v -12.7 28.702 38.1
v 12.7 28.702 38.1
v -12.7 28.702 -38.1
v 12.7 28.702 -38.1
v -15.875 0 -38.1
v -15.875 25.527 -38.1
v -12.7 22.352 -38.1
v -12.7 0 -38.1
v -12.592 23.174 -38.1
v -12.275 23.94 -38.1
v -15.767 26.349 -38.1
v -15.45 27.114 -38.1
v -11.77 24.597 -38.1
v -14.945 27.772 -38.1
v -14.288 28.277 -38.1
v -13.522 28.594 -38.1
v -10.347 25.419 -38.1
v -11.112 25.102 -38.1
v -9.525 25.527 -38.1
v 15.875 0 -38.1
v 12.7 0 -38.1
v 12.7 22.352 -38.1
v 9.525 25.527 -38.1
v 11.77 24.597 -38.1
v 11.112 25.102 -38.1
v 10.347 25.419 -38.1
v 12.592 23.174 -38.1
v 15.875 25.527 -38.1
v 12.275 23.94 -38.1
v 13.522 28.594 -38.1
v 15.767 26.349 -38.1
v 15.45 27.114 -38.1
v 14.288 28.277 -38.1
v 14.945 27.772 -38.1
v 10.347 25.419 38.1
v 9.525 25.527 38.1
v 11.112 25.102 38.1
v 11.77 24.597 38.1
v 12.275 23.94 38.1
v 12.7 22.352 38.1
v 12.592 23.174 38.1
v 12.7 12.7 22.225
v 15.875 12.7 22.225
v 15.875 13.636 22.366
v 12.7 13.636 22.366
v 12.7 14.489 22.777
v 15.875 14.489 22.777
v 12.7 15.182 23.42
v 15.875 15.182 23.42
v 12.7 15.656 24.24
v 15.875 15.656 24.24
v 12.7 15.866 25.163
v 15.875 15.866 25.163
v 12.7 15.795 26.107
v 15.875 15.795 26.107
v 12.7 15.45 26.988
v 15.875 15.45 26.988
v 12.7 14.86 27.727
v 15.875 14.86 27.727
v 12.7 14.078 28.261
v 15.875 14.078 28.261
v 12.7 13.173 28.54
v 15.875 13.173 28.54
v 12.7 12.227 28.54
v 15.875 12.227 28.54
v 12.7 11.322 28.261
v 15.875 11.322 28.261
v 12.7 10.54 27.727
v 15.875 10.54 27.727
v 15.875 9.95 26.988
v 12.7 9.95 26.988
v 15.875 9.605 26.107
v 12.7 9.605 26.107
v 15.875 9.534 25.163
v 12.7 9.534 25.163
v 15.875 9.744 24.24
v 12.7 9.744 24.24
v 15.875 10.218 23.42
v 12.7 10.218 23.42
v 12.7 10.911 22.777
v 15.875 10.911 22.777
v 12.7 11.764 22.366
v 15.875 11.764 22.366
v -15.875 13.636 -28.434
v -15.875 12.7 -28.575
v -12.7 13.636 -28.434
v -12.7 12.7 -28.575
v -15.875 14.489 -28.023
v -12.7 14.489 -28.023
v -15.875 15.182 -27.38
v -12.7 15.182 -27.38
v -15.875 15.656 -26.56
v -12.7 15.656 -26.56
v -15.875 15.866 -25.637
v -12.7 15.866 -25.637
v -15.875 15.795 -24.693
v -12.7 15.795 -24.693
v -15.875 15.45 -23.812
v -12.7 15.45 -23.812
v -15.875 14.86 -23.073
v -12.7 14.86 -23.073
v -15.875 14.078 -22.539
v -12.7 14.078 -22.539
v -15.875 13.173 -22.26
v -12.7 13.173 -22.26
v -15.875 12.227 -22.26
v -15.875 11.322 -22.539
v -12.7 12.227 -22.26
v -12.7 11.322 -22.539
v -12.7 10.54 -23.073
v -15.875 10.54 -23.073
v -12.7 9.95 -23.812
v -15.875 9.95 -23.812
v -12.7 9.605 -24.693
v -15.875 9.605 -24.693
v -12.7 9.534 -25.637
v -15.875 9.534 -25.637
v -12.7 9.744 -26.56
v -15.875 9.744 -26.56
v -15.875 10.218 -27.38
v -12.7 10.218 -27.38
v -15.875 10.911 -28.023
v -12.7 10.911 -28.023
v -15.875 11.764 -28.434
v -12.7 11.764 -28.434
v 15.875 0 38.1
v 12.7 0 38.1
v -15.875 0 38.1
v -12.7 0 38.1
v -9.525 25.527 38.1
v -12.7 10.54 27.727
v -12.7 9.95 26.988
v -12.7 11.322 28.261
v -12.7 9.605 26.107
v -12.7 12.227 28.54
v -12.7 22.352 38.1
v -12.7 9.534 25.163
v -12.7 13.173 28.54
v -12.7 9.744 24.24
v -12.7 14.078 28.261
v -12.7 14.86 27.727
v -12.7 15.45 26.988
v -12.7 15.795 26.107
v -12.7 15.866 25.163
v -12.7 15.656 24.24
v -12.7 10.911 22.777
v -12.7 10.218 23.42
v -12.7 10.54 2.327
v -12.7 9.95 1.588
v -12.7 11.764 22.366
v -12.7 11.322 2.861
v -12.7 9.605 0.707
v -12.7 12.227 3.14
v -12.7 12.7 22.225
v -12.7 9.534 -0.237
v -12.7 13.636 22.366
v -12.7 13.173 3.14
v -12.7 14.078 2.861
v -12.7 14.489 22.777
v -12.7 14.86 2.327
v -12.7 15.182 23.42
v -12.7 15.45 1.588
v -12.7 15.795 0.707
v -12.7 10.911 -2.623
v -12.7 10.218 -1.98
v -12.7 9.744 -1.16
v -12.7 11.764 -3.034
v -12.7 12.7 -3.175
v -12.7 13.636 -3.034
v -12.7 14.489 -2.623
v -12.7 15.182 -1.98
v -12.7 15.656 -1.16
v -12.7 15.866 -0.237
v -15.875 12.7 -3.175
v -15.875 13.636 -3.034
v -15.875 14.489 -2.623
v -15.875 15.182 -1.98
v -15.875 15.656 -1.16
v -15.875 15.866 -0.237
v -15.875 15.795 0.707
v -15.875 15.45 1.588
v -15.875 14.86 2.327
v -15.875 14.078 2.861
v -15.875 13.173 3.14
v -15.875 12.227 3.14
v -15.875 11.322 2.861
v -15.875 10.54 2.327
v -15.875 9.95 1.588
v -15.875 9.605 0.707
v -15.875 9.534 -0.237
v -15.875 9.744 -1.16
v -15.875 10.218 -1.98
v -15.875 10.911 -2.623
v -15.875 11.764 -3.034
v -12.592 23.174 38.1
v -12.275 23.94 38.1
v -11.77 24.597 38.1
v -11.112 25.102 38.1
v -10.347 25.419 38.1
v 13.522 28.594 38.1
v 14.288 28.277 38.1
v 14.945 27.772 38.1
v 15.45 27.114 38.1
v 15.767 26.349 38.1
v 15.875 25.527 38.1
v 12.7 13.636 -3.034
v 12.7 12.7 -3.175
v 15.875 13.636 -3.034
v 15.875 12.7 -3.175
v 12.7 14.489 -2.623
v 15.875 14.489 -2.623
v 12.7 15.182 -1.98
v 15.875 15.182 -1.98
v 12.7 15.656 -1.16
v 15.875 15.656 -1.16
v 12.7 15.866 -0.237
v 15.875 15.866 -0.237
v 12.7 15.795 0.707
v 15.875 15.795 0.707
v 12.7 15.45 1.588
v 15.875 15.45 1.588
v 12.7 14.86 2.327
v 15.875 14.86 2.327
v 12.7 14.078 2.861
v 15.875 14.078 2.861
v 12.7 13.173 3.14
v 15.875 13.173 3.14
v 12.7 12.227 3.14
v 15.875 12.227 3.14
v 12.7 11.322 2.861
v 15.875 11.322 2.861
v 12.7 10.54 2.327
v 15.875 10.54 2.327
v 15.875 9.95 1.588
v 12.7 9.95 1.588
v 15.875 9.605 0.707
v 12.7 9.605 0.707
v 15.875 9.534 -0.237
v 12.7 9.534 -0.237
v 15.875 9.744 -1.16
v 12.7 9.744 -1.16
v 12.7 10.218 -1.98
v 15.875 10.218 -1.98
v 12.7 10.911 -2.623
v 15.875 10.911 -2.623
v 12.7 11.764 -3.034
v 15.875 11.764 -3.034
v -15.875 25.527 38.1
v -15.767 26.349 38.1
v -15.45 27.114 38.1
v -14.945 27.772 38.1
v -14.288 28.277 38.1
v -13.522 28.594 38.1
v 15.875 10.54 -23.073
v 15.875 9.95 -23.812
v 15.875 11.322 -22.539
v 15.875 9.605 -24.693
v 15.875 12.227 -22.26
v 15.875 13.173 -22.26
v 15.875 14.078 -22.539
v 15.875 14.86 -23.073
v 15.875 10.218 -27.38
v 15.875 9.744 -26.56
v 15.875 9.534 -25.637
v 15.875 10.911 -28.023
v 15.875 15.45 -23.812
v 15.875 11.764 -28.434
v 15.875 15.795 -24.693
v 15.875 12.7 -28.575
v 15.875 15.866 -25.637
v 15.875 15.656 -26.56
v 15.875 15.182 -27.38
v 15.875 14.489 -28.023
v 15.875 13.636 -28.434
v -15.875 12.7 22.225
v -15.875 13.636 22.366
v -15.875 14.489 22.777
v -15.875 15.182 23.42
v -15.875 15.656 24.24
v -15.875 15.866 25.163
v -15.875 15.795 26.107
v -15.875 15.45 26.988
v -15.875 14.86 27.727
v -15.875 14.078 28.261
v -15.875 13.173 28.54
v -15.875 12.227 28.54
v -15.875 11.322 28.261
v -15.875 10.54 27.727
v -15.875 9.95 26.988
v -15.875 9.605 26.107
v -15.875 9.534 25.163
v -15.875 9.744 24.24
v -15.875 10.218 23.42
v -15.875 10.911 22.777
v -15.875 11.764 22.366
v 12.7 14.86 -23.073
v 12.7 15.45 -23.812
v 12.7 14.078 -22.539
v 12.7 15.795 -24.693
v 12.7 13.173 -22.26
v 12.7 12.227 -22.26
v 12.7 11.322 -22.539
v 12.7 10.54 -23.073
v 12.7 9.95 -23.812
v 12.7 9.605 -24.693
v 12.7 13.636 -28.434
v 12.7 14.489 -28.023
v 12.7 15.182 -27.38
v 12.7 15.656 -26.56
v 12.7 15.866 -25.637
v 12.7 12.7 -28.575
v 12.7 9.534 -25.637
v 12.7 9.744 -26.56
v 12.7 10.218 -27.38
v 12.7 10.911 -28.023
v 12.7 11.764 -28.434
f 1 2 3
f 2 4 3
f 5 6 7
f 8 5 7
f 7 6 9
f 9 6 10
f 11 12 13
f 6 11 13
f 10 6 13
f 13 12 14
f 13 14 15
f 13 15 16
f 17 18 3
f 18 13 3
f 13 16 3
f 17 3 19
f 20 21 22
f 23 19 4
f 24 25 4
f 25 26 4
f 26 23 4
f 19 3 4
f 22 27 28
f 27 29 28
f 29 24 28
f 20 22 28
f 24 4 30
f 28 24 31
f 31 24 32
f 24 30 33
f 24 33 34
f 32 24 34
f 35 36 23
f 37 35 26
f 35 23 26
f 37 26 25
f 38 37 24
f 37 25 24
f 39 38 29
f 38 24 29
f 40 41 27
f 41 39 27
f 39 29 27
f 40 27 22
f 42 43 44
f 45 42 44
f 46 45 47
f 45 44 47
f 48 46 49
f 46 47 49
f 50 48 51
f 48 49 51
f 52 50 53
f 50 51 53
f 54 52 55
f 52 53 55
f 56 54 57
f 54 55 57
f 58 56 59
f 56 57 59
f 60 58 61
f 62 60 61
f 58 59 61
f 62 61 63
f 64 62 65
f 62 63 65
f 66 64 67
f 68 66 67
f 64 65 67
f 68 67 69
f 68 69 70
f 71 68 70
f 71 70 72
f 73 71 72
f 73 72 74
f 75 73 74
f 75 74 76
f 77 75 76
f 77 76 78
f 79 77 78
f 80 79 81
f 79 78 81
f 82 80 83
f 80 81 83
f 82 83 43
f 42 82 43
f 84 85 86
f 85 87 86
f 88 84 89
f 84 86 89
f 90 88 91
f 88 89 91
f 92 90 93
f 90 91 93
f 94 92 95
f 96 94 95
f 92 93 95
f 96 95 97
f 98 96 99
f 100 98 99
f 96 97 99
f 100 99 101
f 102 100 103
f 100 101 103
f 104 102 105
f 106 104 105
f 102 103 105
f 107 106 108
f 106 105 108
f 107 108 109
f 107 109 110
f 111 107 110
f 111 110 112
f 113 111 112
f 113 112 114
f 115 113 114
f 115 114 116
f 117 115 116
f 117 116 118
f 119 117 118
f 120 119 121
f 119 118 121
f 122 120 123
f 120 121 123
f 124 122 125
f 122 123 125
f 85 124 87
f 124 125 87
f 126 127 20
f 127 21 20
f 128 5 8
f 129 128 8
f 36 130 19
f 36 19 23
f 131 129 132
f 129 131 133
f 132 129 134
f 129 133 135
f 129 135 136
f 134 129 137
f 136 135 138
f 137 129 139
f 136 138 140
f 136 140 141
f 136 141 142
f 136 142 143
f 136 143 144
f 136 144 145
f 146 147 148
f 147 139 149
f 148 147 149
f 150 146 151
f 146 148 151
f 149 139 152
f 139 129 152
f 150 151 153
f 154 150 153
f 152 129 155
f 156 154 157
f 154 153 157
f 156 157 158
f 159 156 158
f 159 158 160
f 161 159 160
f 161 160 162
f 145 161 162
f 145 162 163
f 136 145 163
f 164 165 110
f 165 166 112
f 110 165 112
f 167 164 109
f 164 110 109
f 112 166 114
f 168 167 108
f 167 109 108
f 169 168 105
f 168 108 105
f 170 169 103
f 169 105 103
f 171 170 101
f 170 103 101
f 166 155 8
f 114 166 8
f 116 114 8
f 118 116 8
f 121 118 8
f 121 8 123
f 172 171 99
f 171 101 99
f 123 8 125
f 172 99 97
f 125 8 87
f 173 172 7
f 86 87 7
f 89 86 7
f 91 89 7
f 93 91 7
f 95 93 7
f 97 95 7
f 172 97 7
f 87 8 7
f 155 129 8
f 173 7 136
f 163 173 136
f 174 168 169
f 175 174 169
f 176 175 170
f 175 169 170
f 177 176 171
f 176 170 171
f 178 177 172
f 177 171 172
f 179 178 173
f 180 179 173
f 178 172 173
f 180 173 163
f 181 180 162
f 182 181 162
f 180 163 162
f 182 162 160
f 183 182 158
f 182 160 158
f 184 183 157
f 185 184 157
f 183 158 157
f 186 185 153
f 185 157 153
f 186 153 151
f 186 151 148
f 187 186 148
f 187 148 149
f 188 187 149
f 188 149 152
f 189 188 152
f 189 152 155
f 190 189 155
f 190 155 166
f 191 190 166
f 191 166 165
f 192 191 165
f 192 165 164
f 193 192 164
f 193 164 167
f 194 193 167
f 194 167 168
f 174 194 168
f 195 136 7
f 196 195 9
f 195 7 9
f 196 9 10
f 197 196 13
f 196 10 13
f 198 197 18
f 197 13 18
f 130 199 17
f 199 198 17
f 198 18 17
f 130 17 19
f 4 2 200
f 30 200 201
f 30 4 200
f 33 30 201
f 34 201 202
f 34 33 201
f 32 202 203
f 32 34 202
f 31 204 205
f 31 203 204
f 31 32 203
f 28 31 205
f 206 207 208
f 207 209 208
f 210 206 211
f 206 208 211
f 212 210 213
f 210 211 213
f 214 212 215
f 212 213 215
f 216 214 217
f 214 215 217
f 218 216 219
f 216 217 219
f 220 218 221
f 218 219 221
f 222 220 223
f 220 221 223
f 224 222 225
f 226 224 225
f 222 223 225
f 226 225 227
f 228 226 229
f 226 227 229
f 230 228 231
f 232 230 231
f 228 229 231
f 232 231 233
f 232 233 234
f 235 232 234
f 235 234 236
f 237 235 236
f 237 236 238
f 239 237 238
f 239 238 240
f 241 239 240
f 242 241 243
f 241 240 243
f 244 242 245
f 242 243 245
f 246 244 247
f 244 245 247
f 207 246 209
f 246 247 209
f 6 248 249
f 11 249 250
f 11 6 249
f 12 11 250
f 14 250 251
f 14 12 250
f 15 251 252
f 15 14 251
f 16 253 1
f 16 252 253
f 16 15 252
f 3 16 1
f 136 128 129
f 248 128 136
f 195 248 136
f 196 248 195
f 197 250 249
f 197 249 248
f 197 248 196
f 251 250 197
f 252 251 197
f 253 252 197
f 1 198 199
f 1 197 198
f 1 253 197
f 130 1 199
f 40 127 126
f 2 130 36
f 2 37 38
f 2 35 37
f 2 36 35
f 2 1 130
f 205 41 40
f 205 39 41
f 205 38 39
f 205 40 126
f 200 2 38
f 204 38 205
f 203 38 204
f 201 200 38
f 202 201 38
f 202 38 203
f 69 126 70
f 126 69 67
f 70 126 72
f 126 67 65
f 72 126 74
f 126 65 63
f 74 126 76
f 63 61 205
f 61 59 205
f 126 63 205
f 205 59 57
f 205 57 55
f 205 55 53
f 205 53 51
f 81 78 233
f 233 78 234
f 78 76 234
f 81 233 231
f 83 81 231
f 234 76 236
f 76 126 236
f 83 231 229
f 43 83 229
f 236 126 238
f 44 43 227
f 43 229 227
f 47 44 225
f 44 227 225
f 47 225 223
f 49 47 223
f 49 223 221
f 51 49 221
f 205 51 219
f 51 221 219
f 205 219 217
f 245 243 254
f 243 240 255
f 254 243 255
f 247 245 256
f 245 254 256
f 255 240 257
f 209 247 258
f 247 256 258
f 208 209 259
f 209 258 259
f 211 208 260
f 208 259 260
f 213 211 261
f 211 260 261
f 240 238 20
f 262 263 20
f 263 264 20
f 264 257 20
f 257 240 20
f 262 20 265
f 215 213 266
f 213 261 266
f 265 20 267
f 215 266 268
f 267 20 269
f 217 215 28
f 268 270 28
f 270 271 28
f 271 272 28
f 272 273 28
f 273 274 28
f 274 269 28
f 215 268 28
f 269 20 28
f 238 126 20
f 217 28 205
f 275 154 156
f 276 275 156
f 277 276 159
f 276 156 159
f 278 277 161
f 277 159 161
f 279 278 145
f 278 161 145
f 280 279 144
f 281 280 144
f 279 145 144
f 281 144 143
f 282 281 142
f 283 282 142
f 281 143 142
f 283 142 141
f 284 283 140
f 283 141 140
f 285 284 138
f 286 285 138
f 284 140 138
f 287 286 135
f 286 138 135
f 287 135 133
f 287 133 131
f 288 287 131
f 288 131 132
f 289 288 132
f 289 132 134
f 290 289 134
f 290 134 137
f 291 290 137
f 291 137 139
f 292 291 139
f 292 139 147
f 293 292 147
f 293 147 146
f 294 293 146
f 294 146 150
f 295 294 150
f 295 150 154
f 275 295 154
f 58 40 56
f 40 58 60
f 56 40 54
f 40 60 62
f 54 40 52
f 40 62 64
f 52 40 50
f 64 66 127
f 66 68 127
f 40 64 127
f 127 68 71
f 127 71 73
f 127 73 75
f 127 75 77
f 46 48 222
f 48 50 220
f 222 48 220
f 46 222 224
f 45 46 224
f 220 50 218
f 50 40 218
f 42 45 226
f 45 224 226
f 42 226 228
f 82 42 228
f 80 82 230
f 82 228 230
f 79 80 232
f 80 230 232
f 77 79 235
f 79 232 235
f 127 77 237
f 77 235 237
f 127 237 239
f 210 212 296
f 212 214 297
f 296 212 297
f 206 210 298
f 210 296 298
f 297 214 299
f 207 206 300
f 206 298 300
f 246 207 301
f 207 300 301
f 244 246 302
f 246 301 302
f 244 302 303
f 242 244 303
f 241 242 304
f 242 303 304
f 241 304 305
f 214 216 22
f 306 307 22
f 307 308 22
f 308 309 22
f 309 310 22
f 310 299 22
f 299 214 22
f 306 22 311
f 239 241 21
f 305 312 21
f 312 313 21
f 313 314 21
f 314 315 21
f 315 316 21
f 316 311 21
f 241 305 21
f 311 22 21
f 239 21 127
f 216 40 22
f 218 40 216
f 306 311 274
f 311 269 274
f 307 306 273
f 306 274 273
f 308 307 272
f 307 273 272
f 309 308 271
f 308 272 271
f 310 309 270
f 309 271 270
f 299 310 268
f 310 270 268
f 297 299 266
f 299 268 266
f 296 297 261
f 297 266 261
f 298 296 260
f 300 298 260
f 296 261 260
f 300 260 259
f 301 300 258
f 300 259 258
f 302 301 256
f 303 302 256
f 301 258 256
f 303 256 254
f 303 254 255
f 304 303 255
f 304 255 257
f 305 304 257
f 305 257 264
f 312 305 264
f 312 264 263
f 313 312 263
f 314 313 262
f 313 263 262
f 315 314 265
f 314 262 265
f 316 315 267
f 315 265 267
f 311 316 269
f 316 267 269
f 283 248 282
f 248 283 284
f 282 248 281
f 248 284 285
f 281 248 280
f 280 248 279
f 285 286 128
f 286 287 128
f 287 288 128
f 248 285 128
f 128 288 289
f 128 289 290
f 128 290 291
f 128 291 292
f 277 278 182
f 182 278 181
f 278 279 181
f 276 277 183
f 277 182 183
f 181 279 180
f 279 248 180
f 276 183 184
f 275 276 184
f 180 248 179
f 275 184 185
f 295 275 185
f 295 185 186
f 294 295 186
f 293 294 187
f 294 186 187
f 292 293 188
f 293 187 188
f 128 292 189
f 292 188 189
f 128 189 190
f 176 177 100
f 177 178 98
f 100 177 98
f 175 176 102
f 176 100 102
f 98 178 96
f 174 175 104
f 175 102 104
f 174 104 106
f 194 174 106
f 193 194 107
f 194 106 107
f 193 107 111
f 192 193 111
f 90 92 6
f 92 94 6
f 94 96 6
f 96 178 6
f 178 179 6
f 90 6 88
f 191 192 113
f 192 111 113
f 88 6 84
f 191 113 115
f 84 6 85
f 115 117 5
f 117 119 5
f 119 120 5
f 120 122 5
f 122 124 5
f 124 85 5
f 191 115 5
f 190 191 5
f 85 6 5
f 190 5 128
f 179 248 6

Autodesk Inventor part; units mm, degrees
ref_plane "YZ Plane" through (0, 0, 0) normal (1, 0, 0) x (0, 1, 0)
ref_plane "XZ Plane" through (0, 0, 0) normal (0, 1, 0) x (-1, 0, 0)
ref_plane "XY Plane" through (0, 0, 0) normal (0, 0, 1) x (1, 0, 0)
sketch "Sketch1" plane through (0, 0, 0) normal (0, 0, 1) x (1, 0, 0)
  line L0 (-15.875, 0) -> (-12.7, 0)
  line L1 (-12.7, 0) -> (-12.7, 22.352)
  line L2 (-9.525, 25.527) -> (9.525, 25.527)
  line L3 (12.7, 22.352) -> (12.7, 0)
  line L4 (12.7, 0) -> (15.875, 0)
  line L5 (15.875, 0) -> (15.875, 25.527)
  line L6 (12.7, 28.702) -> (-12.7, 28.702)
  line L7 (-15.875, 25.527) -> (-15.875, 0)
  arc A0 (-9.525, 25.527) -> (-12.7, 22.352) centre (-9.525, 22.352) ccw
  arc A1 (12.7, 22.352) -> (9.525, 25.527) centre (9.525, 22.352) ccw
  arc A2 (-12.7, 28.702) -> (-15.875, 25.527) centre (-12.7, 25.527) ccw
  arc A3 (15.875, 25.527) -> (12.7, 28.702) centre (12.7, 25.527) ccw
  line L8 (0, 35.2315) -> (0, -5.8719) projected
  point P0 (0, 0)
  dimension "d0" = 28.702
  dimension "d1" = 31.75
  dimension "d2" = 3.175
  dimension "d3" = 3.175
  dimension "d4" = 3.175
extrude "Extrusion1" add sketch "Sketch1" along normal mid plane 76.2
sketch "Sketch4" plane through (15.875, 0, 38.1) normal (1, 0, 0) x (0, 0, -1)
  line L0 (-79.375, 0) -> (476.25, 0) projected
  line L1 (38.1, -5.7404) -> (38.1, 34.4424) projected
  circle A0 centre (38.1, 12.7) radius 3.175
  point P0 (38.1, 0)
  dimension "d35" = 12.7
  dimension "d36" = 0
  dimension "d37" = 6.35
extrude "Extrusion4" cut sketch "Sketch4" against normal up to surface (31.75 mm away)
pattern_linear "Rectangular Pattern3" count 20 spacing 25.4 along (0, 0, 1) count 20 spacing 25.4 along (0, 0, -1) of "Extrusion4"
equation "\"d5\" = SideLength"
equation "\"SideLength\" = 76.2"
properties part number "Electronics Board Raiser" material "Aluminum 6061"
